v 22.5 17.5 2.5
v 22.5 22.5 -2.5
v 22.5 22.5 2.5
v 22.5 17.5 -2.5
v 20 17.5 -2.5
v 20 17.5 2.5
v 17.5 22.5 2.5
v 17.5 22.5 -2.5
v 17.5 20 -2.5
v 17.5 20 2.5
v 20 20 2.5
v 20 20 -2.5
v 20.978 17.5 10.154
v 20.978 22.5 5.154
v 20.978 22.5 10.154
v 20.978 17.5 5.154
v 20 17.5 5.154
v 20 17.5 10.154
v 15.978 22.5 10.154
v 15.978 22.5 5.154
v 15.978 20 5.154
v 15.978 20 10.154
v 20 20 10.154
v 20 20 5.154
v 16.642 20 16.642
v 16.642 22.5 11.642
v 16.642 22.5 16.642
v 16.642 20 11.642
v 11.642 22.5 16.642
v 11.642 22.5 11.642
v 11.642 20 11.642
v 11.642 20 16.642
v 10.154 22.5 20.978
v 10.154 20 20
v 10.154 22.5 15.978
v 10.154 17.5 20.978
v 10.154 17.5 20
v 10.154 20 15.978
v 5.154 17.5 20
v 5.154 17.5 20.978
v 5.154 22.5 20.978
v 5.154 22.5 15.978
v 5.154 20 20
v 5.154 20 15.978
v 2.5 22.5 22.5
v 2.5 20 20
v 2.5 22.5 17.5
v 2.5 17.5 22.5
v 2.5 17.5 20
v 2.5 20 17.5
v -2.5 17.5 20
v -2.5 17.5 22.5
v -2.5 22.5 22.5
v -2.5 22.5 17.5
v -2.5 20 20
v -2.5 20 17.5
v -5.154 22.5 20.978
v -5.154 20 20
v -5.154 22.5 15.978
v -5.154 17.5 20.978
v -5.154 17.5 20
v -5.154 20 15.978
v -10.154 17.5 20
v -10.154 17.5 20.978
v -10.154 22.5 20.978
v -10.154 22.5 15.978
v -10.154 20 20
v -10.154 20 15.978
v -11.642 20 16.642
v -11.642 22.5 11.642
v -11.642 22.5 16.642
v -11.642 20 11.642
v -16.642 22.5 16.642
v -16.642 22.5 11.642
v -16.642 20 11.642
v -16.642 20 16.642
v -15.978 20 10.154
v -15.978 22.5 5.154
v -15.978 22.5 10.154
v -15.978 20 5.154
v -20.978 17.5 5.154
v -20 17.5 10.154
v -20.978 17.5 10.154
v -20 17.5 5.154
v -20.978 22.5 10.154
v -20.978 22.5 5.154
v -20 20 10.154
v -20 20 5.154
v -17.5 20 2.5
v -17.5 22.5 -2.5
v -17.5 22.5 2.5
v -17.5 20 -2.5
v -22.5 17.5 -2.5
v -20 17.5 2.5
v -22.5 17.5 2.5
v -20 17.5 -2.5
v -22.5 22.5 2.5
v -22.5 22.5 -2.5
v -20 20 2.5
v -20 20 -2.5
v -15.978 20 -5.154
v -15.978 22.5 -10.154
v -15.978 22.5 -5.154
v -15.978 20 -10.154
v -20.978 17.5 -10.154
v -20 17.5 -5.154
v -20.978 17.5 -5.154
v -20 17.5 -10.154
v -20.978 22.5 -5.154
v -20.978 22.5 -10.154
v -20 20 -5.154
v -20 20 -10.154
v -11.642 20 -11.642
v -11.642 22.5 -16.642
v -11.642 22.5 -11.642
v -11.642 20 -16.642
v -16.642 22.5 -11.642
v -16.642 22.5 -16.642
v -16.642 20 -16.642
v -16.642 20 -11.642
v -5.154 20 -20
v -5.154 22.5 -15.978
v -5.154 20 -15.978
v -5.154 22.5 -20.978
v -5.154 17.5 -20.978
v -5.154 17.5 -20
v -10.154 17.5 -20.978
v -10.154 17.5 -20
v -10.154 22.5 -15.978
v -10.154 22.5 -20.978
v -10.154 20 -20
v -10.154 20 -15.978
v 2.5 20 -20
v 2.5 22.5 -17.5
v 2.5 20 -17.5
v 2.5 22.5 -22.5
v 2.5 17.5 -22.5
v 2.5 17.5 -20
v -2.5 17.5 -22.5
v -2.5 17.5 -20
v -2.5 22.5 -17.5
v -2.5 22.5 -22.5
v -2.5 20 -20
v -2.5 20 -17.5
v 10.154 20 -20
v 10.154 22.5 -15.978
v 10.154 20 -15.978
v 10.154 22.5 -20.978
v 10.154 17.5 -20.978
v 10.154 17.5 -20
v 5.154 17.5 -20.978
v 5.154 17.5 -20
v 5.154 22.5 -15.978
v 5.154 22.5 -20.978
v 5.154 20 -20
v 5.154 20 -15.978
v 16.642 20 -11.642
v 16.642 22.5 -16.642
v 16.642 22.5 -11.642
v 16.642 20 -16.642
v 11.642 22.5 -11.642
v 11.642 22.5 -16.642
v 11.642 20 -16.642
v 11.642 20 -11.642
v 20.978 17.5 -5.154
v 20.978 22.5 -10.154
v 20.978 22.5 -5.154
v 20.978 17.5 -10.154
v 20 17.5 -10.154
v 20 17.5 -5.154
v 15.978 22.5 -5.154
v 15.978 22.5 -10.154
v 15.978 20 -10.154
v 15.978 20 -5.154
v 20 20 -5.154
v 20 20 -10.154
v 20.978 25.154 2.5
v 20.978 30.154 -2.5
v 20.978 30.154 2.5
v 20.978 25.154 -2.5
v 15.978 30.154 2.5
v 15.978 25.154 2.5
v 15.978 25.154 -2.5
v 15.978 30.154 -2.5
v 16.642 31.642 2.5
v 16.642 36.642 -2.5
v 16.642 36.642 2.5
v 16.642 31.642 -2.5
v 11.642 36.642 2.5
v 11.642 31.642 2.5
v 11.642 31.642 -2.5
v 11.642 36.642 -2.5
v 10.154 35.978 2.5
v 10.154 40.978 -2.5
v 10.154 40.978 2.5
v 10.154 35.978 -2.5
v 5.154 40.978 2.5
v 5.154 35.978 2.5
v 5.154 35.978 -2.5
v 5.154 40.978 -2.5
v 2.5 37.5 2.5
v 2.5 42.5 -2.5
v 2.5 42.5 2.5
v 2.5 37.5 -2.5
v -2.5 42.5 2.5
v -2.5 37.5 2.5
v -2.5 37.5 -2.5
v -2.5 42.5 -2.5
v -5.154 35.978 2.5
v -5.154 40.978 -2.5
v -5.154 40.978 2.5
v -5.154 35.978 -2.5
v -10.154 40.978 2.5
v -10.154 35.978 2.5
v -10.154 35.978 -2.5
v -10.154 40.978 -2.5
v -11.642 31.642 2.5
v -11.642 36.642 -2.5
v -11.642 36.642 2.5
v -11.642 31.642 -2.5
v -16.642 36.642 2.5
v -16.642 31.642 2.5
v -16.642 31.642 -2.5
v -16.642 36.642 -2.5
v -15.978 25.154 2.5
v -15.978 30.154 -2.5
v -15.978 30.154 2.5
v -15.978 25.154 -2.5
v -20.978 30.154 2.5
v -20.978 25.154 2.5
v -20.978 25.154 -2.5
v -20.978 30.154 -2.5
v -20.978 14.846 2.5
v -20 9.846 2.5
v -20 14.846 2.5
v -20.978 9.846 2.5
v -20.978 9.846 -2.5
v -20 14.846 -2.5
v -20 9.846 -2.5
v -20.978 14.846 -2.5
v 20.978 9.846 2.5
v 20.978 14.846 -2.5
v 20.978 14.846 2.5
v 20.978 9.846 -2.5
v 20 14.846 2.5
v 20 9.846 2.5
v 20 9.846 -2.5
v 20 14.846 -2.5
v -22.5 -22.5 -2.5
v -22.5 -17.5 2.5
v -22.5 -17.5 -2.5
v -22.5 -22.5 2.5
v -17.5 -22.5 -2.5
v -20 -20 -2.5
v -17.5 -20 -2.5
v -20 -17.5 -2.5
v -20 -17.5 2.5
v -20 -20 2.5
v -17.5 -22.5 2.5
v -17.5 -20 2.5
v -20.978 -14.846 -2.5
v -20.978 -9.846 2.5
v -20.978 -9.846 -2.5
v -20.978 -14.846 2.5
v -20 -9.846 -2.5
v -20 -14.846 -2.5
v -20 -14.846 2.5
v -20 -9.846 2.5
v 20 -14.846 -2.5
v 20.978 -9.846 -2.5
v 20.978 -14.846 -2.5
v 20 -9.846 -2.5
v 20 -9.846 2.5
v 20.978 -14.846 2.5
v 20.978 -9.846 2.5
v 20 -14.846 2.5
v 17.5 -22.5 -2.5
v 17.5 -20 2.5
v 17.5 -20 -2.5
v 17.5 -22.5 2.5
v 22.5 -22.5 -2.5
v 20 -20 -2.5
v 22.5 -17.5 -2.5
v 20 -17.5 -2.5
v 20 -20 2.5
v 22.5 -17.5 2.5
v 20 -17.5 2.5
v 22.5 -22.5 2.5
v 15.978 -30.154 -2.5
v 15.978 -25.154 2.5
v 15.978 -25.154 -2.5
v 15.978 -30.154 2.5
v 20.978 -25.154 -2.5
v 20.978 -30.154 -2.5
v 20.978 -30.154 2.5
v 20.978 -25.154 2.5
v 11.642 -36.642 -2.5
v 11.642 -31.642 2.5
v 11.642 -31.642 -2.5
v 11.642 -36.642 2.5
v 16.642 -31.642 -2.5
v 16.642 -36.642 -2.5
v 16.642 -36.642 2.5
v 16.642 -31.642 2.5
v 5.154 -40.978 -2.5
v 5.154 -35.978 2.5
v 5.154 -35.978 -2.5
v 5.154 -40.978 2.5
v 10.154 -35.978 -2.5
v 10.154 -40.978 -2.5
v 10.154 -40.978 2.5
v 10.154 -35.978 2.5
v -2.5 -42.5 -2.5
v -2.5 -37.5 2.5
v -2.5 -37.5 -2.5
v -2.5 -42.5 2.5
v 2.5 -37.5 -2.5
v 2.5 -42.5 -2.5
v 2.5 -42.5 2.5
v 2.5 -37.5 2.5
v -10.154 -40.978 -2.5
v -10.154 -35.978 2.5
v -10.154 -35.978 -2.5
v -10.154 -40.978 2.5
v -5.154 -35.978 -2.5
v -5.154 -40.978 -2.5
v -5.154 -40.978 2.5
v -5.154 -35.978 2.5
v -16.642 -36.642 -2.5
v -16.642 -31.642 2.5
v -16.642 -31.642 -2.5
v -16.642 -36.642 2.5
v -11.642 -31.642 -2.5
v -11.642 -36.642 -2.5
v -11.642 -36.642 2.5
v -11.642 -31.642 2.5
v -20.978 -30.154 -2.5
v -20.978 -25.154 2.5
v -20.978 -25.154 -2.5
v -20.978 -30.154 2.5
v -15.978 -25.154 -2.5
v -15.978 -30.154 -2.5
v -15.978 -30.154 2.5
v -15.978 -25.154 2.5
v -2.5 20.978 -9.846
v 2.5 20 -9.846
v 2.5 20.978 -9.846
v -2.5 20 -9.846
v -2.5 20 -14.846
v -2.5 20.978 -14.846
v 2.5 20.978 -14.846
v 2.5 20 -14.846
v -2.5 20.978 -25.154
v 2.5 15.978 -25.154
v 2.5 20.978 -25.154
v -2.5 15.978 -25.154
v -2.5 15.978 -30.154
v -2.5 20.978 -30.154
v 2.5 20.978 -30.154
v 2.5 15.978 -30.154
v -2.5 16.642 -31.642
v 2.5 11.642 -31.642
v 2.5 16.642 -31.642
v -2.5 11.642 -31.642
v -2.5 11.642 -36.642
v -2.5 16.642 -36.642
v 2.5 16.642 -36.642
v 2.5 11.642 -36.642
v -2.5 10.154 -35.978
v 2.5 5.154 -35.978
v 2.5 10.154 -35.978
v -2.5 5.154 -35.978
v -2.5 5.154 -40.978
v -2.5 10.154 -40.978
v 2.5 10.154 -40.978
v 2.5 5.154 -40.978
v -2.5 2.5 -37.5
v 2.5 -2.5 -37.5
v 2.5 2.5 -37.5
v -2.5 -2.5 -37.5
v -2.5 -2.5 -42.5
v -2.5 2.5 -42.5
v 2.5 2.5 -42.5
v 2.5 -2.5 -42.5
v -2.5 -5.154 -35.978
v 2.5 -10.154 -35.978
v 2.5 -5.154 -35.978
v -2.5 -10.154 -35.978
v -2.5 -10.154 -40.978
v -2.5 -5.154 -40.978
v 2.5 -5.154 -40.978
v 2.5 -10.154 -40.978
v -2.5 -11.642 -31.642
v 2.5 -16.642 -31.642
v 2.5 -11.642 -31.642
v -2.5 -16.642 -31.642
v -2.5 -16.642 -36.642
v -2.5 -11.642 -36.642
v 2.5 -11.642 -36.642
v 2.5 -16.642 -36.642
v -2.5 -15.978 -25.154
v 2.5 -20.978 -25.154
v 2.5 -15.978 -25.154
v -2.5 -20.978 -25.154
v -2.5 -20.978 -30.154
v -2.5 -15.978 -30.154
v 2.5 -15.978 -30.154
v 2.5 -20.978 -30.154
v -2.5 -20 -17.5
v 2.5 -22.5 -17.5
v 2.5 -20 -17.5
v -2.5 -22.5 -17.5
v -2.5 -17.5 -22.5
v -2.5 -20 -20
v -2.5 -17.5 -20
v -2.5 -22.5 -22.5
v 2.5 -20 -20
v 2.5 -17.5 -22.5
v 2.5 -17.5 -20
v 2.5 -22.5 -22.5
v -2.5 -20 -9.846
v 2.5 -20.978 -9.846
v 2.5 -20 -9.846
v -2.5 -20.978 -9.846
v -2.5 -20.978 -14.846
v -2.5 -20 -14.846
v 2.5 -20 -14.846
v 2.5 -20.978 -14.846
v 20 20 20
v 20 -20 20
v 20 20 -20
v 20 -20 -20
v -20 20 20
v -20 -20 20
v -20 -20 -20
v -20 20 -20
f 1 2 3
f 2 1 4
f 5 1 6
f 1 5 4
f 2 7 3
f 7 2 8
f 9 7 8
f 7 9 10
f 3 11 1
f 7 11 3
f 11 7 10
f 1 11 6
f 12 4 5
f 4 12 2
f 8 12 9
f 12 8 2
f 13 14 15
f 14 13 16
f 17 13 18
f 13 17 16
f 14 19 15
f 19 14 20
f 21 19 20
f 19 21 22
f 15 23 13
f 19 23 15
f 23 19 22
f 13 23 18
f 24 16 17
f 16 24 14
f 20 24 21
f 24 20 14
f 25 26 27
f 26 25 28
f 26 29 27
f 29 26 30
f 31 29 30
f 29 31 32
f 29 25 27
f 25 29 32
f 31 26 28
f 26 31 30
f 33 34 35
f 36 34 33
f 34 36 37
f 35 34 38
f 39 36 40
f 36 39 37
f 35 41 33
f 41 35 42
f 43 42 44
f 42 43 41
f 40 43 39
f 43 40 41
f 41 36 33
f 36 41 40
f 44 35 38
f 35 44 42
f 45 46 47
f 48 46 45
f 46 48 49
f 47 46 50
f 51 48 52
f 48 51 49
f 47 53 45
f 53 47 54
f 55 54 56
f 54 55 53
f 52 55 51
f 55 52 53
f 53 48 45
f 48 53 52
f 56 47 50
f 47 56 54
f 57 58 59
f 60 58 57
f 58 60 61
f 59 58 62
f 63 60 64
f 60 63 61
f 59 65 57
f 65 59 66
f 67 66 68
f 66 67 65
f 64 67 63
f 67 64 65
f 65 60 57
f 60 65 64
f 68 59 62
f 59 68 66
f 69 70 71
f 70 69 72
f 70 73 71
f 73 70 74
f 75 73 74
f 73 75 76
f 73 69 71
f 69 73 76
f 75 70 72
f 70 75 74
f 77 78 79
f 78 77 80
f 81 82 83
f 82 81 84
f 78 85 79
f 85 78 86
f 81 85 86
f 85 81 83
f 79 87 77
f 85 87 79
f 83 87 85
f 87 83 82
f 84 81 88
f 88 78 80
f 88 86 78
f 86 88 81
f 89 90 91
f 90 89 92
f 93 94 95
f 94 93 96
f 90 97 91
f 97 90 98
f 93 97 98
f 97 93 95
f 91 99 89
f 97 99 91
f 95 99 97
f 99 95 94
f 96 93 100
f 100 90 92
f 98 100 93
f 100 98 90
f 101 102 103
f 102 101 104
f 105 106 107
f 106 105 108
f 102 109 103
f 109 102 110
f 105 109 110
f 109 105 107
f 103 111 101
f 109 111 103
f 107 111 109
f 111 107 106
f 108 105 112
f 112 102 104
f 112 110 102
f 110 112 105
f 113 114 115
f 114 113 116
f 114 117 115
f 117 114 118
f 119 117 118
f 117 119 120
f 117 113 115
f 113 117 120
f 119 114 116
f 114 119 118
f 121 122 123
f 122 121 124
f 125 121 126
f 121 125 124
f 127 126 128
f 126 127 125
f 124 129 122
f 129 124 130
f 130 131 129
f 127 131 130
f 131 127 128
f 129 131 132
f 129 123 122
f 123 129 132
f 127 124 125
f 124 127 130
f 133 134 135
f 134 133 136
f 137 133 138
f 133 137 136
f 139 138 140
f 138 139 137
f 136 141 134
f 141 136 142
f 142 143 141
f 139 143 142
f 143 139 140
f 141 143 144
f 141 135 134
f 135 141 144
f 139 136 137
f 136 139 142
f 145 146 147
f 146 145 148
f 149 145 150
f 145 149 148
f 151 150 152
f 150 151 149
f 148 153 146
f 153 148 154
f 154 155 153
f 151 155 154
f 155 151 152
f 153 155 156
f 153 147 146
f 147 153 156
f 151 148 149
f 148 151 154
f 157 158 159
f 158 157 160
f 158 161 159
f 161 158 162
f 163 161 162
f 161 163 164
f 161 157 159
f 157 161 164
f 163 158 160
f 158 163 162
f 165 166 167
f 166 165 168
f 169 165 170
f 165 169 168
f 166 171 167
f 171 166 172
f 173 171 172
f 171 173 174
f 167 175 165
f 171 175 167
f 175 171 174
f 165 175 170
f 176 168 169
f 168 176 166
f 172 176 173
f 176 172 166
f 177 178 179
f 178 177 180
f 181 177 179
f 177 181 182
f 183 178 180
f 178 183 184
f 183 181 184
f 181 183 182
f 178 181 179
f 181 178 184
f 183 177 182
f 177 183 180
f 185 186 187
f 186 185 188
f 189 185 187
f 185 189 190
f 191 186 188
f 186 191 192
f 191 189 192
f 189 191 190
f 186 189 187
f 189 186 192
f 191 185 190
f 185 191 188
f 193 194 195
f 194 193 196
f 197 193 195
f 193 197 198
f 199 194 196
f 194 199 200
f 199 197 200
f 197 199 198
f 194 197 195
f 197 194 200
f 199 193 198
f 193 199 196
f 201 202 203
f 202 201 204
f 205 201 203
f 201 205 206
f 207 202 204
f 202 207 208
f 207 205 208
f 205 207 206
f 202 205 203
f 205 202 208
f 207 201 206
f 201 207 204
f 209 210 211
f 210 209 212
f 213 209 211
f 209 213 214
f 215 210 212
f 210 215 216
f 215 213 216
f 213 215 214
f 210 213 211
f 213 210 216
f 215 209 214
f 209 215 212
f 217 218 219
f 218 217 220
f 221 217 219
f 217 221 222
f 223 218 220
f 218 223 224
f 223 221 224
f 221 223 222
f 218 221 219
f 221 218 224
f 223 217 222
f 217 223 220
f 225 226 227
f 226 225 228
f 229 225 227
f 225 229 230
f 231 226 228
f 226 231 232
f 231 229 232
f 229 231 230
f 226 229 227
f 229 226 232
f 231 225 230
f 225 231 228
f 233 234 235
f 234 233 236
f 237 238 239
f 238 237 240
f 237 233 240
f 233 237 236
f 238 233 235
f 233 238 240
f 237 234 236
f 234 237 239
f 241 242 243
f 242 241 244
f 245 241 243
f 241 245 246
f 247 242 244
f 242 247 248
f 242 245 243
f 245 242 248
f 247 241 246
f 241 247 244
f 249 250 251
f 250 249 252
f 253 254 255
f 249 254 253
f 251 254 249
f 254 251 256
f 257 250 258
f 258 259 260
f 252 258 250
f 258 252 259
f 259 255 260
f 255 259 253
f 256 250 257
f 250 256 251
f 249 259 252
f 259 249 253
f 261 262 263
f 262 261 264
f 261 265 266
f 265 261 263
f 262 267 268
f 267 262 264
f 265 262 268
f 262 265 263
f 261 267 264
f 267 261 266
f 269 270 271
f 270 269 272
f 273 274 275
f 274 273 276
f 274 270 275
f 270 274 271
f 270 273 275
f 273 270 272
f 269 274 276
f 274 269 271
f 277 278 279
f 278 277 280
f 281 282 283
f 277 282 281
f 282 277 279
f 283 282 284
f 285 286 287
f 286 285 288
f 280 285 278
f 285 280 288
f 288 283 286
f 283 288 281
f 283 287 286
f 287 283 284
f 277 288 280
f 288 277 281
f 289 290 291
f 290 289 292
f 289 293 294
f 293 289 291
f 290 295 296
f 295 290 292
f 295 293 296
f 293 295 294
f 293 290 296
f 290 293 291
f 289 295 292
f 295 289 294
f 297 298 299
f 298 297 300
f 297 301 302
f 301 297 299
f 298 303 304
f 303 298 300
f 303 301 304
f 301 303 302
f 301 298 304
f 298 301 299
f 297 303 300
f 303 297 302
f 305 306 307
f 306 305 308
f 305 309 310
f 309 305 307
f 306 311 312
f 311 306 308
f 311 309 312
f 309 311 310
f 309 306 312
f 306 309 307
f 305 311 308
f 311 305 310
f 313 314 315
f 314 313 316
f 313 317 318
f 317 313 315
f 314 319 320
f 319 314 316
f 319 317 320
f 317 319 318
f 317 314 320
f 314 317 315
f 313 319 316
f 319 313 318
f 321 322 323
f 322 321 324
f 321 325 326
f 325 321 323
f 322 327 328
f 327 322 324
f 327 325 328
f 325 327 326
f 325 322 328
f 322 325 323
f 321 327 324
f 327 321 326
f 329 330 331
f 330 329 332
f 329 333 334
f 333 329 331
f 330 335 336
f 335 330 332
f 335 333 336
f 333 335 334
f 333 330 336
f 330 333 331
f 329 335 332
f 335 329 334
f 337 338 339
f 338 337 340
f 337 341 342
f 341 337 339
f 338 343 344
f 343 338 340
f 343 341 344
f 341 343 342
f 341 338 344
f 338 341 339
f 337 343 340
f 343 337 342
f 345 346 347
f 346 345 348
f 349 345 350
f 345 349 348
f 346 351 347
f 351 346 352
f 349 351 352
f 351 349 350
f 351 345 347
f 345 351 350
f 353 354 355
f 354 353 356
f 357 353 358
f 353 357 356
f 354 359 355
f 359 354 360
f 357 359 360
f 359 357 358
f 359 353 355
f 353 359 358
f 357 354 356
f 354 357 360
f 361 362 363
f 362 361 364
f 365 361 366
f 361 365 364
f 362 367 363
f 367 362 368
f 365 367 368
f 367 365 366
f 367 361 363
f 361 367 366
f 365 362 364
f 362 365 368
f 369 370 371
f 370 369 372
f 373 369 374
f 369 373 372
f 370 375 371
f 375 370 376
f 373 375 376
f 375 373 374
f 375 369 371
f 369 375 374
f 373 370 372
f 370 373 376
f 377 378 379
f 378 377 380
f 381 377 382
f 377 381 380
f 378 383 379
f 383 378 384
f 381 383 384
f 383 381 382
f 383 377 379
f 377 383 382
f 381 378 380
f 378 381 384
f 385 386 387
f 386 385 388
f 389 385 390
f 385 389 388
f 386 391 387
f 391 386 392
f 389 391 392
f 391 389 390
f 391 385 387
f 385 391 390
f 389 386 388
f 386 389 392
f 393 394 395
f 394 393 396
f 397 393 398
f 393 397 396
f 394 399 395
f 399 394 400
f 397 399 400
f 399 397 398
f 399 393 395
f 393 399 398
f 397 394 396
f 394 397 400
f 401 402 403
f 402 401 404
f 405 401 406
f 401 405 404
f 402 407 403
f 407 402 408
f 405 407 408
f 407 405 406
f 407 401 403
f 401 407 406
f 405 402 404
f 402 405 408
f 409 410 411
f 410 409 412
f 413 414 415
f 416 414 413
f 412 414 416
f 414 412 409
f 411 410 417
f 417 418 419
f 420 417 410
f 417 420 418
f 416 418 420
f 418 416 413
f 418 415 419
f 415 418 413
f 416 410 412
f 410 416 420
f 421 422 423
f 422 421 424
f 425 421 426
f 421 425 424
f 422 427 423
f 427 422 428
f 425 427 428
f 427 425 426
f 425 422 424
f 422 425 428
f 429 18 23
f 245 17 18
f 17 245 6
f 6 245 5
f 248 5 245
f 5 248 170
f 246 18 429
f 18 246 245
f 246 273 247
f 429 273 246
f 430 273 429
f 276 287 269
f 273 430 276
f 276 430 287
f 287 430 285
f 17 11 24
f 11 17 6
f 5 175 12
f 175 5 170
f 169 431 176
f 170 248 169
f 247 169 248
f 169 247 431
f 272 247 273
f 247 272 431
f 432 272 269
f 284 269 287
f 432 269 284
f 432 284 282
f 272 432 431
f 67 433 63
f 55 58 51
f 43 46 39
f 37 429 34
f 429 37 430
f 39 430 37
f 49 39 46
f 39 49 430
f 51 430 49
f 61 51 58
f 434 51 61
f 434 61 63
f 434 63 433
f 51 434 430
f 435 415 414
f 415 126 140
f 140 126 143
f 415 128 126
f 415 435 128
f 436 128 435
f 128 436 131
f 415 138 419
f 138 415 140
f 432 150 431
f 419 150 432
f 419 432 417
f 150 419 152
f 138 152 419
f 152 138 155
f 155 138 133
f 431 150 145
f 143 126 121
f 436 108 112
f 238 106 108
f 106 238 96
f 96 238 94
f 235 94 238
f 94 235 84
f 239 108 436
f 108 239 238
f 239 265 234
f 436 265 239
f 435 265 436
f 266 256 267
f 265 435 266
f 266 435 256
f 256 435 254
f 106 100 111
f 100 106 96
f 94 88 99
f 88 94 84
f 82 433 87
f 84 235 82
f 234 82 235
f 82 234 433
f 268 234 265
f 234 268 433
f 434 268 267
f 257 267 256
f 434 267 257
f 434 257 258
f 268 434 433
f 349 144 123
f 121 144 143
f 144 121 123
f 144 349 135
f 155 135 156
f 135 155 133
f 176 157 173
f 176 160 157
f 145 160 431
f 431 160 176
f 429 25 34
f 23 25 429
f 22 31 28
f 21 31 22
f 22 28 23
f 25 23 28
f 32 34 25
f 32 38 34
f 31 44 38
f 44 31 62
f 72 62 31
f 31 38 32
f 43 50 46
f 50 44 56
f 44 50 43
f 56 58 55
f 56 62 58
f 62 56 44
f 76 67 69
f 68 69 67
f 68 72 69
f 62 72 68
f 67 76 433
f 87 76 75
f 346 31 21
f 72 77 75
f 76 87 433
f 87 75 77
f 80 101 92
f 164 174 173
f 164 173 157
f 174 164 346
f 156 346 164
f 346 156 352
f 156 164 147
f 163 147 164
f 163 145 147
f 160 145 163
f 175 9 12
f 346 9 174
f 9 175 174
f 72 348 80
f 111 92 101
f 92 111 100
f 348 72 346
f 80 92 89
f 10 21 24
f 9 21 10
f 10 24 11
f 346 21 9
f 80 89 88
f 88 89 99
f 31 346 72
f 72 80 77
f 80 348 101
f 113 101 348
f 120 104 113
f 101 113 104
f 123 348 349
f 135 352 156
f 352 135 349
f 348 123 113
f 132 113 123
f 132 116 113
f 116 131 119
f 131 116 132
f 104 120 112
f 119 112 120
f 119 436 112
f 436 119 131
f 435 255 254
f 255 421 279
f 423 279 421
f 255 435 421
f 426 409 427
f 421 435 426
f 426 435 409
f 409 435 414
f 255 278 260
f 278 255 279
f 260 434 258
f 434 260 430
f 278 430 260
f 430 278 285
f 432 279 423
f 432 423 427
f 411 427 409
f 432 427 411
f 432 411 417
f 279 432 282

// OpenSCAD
// Parameters
block_size = 40; // Size of the main block
small_block_size = 5; // Size of the small blocks
num_blocks = 16; // Number of small blocks in a circle
radius_offset = 20; // Distance from the center to the center of small blocks

module circular_blocks_on_face() {
    for (i = [0:num_blocks - 1]) {
        angle = 360 / num_blocks * i;
        translate([radius_offset * cos(angle), radius_offset * sin(angle), 0])
            cube(small_block_size, center = true);
    }
}

module block_with_circular_blocks() {
    // Main block
    cube([block_size, block_size, block_size], center = true);

    // Add circular blocks on each face of the block
    for (side = [0 : 5]) {
        rotate_vector = vectors_to_rotate(side);
        translate_vector = vectors_to_translate(side);

        rotate(rotate_vector)
            translate(translate_vector)
                circular_blocks_on_face();
    }
}

// Define rotation vectors for each cube face
function vectors_to_rotate(side) = [
    [90, 0, 0], // Bottom face
    [-90, 0, 0], // Top face
    [0, 0, 0], // Front face
    [0, 180, 0], // Back face
    [0, -90, 0], // Left face
    [0, 90, 0] // Right face
][side];

// Define translation vectors for each cube face
function vectors_to_translate(side) = [
    [0, 0, -block_size / 2], // Bottom face
    [0, 0, block_size / 2], // Top face
    [0, block_size / 2, 0], // Front face
    [0, -block_size / 2, 0], // Back face
    [-block_size / 2, 0, 0], // Left face
    [block_size / 2, 0, 0] // Right face
][side];

// Render the block with small blocks on each face
block_with_circular_blocks();
